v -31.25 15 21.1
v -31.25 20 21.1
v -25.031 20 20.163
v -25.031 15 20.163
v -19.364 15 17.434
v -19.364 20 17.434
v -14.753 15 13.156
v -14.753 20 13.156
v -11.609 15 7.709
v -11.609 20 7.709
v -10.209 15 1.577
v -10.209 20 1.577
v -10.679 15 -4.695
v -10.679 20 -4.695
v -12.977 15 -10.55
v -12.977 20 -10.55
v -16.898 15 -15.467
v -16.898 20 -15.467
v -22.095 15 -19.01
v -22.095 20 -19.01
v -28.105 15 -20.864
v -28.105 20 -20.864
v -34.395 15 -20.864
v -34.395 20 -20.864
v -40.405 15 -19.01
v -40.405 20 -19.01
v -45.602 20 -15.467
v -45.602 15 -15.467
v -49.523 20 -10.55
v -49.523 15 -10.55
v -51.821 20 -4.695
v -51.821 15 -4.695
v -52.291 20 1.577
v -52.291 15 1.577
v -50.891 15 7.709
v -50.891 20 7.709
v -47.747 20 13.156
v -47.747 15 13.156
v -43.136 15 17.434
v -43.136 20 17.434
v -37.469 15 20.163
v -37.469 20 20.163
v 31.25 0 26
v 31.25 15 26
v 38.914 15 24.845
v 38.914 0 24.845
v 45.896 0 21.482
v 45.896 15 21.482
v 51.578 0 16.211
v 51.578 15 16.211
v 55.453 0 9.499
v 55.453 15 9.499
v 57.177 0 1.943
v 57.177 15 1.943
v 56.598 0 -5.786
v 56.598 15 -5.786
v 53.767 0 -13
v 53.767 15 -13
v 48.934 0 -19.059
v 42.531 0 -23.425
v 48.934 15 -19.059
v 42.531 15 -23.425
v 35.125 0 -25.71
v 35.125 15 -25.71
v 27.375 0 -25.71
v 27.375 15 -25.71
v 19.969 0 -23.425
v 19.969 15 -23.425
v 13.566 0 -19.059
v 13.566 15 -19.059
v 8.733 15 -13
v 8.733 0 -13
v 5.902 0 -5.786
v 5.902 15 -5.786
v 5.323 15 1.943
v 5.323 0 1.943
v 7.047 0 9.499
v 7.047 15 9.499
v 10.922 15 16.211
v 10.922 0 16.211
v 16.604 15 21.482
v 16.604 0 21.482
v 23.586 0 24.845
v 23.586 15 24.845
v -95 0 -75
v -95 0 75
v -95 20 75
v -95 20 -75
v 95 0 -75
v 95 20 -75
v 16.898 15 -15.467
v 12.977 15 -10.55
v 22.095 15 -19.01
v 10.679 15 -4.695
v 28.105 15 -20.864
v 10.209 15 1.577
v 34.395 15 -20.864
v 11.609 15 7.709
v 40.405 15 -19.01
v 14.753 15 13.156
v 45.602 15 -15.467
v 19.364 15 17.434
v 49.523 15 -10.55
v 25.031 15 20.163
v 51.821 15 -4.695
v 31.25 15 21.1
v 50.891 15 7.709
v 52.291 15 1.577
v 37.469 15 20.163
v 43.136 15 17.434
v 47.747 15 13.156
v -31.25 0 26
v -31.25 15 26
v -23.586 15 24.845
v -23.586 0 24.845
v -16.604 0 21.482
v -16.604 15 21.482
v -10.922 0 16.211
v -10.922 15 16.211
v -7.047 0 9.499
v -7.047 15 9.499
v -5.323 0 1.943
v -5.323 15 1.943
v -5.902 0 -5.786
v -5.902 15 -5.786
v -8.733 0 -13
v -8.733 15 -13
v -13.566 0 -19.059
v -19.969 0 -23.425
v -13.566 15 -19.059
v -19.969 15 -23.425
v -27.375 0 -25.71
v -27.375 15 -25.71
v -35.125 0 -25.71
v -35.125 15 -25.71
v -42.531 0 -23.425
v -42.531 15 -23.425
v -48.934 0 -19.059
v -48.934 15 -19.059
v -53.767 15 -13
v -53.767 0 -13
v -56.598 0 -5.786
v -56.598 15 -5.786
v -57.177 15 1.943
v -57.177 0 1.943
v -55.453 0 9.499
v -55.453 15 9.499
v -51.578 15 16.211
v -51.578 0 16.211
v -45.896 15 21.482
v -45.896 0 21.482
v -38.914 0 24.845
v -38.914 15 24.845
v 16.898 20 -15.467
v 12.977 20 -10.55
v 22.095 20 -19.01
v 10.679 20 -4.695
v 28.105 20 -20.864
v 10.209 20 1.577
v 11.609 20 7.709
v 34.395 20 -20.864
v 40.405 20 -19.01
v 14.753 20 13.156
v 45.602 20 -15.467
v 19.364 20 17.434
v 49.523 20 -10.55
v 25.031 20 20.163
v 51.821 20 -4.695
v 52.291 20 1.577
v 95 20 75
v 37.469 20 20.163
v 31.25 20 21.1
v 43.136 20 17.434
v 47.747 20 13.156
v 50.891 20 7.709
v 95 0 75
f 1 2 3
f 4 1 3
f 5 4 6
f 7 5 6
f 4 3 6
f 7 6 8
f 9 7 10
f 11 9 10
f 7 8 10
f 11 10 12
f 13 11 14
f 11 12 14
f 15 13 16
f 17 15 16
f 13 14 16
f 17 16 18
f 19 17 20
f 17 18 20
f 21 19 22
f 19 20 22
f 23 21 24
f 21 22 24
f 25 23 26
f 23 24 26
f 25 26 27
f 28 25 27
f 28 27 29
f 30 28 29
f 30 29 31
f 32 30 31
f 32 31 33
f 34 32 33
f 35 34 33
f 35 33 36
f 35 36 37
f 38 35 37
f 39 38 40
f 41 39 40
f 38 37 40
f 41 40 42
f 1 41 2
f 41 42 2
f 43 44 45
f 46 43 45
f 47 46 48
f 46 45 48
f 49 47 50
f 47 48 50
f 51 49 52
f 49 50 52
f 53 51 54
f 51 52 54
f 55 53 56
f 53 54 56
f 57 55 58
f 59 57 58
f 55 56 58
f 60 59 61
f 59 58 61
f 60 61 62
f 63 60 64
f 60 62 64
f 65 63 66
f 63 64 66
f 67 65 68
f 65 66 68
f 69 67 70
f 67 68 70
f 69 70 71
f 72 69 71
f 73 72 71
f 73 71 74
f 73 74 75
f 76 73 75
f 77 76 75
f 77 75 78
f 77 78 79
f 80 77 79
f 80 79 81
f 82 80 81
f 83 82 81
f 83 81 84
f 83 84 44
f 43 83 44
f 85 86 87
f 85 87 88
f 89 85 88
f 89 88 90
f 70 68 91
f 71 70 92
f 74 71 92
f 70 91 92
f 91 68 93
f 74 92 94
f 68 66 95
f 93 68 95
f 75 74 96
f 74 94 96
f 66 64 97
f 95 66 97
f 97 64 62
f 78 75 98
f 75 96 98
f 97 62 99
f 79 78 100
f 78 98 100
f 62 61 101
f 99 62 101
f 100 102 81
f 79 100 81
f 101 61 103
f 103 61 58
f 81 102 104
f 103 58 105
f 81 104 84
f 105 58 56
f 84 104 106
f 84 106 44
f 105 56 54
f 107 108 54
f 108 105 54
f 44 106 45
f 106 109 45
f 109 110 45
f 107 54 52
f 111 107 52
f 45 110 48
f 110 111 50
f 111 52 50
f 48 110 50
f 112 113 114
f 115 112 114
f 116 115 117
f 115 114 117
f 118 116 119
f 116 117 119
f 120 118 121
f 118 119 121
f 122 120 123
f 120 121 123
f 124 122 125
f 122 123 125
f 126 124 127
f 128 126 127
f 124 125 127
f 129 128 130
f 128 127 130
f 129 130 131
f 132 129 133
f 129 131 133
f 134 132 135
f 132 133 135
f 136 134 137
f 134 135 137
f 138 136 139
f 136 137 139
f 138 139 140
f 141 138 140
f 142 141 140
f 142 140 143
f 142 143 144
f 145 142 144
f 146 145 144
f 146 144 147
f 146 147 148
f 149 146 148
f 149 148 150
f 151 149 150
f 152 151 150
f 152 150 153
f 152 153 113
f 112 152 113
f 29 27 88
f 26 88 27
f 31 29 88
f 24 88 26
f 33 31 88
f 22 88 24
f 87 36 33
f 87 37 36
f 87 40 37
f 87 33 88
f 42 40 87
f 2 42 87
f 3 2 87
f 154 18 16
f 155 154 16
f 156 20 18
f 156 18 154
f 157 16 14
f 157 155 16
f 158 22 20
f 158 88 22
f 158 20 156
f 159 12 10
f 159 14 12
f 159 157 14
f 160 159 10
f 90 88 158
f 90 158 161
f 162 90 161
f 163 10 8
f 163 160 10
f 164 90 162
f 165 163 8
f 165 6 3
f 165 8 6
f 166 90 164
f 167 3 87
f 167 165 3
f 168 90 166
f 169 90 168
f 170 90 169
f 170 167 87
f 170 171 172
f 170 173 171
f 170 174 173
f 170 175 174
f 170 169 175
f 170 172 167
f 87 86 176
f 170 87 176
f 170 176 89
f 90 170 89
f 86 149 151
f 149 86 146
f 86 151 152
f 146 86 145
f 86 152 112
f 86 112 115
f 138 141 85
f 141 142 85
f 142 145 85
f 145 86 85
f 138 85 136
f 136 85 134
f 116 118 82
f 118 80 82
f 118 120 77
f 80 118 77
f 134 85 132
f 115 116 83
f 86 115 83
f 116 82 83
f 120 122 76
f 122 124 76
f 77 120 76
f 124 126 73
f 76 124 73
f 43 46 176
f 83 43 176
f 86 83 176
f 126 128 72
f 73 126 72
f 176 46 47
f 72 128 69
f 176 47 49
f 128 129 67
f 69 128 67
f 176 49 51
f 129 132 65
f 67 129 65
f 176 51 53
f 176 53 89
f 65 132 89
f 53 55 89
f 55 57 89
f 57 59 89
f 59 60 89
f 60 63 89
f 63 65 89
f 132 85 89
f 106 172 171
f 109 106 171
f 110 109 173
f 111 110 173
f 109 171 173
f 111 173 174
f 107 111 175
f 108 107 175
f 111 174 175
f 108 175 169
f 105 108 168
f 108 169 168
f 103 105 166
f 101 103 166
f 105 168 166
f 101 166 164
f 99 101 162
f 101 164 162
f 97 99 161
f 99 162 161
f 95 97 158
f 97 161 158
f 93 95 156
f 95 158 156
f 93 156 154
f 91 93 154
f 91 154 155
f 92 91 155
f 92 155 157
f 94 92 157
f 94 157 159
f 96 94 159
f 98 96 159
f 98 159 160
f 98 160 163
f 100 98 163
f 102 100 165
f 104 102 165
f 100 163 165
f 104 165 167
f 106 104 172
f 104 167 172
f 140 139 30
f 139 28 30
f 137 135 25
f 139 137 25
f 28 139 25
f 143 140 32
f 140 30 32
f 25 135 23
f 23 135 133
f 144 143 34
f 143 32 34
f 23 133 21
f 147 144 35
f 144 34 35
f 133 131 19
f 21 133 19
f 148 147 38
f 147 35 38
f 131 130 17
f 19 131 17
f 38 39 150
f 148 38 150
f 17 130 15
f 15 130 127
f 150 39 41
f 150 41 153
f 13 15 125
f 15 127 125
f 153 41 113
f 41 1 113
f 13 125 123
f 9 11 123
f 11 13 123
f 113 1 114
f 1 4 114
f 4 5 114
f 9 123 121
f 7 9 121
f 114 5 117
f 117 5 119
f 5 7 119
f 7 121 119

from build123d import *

# Parameters (mm, degrees)
SKETCH1_W           = 190
SKETCH1_H           = 150
BOSS_EXTRUDE1_DEPTH = 20
CUT_EXTRUDE1_REACH  = 124.678
SKETCH2_R           = 26
SKETCH9_R           = 26
SKETCH9_R_2         = 21.1
BOSS_EXTRUDE2_DEPTH = 5


with BuildPart() as part:
    # Sketch1 → Boss-Extrude1 (new body)
    with BuildSketch(Plane(origin=(0, 0, 0), x_dir=(1, 0, 0), z_dir=(0, 1, 0))):
        Rectangle(SKETCH1_W, SKETCH1_H)
    extrude(amount=BOSS_EXTRUDE1_DEPTH)

    # Sketch2 → Cut-Extrude1 (cut, up to next)
    with BuildSketch(Plane(origin=(0, 20, 0), x_dir=(1, 0, 0), z_dir=(0, 1, 0)), mode=Mode.PRIVATE) as cut_extrude1_sk1:
        with Locations(Location((31.25, 0, 0), (0, 0, 270))):
            Circle(SKETCH2_R)
    cut_extrude1_tool1 = extrude(cut_extrude1_sk1.sketch, amount=-CUT_EXTRUDE1_REACH, mode=Mode.PRIVATE) & part.part
    # Sketch2 → Cut-Extrude1 (cut, up to next)
    with BuildSketch(Plane(origin=(0, 20, 0), x_dir=(1, 0, 0), z_dir=(0, 1, 0)), mode=Mode.PRIVATE) as cut_extrude1_sk2:
        with Locations(Location((-31.25, 0, 0), (0, 0, 270))):
            Circle(SKETCH2_R)
    cut_extrude1_tool2 = extrude(cut_extrude1_sk2.sketch, amount=-CUT_EXTRUDE1_REACH, mode=Mode.PRIVATE) & part.part
    add(cut_extrude1_tool1.solids().sort_by_distance((31.25, 20, 0))[0], mode=Mode.SUBTRACT)
    add(cut_extrude1_tool2.solids().sort_by_distance((-31.25, 20, 0))[0], mode=Mode.SUBTRACT)

    # Sketch9 → Boss-Extrude2 (add)
    # profile 1 of 2: a face of its own
    with BuildSketch(Plane(origin=(0, 20, 0), x_dir=(1, 0, 0), z_dir=(0, 1, 0))):
        with Locations(Location((-31.25, 0, 0), (0, 0, 270))):
            Circle(SKETCH9_R)
        with Locations(Location((-31.25, 0, 0), (0, 0, 270))):
            Circle(SKETCH9_R_2, mode=Mode.SUBTRACT)
    # profile 2 of 2: a face of its own
    with BuildSketch(Plane(origin=(0, 20, 0), x_dir=(1, 0, 0), z_dir=(0, 1, 0))):
        with Locations(Location((31.25, 0, 0), (0, 0, 270))):
            Circle(SKETCH9_R)
        with Locations(Location((31.25, 0, 0), (0, 0, 270))):
            Circle(SKETCH9_R_2, mode=Mode.SUBTRACT)
    extrude(amount=-BOSS_EXTRUDE2_DEPTH)


solid = part.part
